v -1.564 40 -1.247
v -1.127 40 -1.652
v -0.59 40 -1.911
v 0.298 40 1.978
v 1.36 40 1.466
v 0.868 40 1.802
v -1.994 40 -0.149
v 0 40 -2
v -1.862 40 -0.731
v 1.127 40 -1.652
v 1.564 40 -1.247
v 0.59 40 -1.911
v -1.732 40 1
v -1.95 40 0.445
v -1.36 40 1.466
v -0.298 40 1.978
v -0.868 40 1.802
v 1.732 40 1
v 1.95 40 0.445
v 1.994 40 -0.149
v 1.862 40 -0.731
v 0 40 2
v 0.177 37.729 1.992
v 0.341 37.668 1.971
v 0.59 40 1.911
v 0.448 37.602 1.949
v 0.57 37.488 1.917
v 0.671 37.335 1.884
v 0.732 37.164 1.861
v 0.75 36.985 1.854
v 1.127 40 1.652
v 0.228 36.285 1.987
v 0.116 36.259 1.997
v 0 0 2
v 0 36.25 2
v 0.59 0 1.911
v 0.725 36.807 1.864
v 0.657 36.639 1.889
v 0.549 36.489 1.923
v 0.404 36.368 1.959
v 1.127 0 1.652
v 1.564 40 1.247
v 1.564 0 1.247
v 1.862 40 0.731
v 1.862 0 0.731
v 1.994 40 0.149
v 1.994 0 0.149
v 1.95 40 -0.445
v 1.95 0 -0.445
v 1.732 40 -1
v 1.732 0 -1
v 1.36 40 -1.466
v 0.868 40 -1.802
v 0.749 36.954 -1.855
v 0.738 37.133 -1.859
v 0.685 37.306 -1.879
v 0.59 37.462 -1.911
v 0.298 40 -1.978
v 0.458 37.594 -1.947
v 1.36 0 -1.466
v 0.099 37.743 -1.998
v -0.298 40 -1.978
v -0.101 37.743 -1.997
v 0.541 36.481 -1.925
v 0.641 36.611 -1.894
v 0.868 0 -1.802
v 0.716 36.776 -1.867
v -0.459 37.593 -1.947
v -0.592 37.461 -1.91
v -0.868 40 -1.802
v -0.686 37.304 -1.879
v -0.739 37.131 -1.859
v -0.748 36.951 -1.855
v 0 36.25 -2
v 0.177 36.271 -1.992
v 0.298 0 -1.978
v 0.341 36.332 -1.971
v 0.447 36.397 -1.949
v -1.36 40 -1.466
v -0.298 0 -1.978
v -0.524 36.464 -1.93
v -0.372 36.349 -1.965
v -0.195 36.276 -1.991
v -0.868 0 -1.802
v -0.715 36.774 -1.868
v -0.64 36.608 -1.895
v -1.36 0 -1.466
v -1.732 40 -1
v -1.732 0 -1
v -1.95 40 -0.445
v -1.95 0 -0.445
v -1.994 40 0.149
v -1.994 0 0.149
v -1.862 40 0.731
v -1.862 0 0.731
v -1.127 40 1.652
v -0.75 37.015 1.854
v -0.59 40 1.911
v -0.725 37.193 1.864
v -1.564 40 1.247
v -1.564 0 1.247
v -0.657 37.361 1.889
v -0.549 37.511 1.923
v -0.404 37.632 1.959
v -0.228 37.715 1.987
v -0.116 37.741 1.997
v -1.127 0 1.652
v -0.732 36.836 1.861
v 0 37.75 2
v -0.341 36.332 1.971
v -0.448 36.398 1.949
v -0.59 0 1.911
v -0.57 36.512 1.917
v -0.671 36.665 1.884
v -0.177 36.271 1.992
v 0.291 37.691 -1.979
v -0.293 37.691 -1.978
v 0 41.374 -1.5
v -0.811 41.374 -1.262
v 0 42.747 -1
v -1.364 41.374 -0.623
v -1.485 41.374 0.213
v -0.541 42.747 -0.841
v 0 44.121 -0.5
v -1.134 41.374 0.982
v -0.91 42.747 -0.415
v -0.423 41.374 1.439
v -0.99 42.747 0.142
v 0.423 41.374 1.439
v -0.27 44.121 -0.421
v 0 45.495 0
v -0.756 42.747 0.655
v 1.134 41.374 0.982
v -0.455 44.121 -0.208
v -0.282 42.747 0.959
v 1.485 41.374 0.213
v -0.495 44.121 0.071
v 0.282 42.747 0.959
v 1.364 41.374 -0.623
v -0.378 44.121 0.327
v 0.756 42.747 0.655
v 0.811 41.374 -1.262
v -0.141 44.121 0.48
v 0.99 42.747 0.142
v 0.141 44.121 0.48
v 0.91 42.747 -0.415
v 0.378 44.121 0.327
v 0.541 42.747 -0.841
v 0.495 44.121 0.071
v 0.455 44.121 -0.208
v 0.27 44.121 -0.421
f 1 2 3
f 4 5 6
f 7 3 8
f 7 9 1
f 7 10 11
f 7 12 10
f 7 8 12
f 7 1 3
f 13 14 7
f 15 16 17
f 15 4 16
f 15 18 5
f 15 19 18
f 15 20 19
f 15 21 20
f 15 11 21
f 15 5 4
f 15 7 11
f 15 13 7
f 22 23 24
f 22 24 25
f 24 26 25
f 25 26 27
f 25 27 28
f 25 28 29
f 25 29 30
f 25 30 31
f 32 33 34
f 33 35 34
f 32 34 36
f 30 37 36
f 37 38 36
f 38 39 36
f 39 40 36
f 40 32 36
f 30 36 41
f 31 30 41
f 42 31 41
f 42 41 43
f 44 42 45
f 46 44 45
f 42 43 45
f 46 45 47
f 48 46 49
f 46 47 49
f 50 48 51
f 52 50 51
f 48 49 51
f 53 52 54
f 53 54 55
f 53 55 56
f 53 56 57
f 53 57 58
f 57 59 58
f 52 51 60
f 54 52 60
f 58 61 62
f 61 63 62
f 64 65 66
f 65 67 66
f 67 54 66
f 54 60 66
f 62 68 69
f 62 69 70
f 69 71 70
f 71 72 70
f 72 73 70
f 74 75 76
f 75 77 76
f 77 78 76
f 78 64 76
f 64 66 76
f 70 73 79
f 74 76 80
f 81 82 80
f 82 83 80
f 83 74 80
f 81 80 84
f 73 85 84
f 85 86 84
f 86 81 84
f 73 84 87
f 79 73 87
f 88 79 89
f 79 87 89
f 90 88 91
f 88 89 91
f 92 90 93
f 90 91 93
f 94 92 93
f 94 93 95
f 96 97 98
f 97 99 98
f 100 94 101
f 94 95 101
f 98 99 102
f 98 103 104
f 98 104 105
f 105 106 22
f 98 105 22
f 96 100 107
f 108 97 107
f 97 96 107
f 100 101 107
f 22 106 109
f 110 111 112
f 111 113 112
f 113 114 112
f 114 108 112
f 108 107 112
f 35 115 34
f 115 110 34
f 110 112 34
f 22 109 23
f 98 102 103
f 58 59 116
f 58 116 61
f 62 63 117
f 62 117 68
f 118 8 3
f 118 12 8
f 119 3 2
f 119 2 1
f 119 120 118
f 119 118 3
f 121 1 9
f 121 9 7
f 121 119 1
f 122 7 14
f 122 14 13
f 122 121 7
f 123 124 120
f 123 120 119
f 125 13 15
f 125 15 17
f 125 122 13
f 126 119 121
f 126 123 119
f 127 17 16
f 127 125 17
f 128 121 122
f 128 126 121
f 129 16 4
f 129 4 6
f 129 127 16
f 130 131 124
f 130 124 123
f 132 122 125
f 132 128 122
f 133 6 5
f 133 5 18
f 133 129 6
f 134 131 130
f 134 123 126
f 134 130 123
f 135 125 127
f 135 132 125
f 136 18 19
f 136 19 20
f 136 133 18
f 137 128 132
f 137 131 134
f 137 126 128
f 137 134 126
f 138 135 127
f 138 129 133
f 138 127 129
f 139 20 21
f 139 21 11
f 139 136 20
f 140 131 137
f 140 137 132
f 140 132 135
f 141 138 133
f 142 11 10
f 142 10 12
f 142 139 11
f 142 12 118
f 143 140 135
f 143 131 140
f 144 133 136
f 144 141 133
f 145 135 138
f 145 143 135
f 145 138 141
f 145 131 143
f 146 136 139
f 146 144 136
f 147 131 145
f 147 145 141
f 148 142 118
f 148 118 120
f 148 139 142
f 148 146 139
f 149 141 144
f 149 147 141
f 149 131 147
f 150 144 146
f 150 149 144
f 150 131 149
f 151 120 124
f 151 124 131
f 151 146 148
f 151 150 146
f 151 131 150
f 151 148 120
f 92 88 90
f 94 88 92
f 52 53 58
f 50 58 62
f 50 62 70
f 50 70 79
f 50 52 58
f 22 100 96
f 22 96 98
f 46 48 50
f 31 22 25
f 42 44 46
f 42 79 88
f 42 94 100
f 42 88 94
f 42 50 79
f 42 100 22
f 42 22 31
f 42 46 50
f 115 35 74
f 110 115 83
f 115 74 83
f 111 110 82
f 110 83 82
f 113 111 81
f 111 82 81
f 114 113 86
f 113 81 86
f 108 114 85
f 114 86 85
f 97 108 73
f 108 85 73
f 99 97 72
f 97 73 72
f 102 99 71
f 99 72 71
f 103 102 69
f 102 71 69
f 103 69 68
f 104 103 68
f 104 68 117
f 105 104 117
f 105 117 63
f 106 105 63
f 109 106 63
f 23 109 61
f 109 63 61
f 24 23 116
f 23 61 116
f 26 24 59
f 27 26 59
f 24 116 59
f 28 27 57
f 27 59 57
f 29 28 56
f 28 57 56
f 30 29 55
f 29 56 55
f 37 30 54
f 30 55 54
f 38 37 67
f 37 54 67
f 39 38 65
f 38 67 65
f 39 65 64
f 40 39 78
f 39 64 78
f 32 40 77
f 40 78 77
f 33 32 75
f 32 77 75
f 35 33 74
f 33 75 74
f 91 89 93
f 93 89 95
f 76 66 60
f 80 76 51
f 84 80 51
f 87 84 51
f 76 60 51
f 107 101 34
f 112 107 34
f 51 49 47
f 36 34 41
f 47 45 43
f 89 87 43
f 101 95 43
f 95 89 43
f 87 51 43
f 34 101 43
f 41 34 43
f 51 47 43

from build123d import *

# Parameters (mm, degrees)
SKETCH1_R           = 2
BOSS_EXTRUDE1_DEPTH = 40
SKETCH21_W          = 0.75
SKETCH21_H          = 4


with BuildPart() as part:
    # Sketch1 → Boss-Extrude1 (new body)
    with BuildSketch(Plane(origin=(0, 0, 0), x_dir=(1, 0, 0), z_dir=(0, 1, 0))):
        with Locations(Location((0, 0, 0), (0, 0, 270))):
            Circle(SKETCH1_R)
    extrude(amount=BOSS_EXTRUDE1_DEPTH)

    # Sketch21 → Ø1.5mm Dowel Hole4 (revolve, cut)
    with BuildSketch(Plane(origin=(0, 37, 2), x_dir=(0, -1, 0), z_dir=(1, 0, 0))):
        with Locations((0.375, 2)):
            Rectangle(SKETCH21_W, SKETCH21_H)
    revolve(axis=Axis((0, 37, 8.35), (0, 0, -1)), mode=Mode.SUBTRACT)


with BuildPart() as body_2:
    # Boss-Extrude2 cone 1 section (through the dimple's axis) → Boss-Extrude2 (revolve)
    with BuildSketch(Plane(origin=(0, 40, 0), x_dir=(0, 0, -1), z_dir=(1, 0, 0))):
        Polygon((0, 0), (2, 0), (0, 5.494954839), align=None)
    revolve(axis=Axis((0, 40, 0), (0, 1, 0)))


solid = Compound([part.part, body_2.part])
